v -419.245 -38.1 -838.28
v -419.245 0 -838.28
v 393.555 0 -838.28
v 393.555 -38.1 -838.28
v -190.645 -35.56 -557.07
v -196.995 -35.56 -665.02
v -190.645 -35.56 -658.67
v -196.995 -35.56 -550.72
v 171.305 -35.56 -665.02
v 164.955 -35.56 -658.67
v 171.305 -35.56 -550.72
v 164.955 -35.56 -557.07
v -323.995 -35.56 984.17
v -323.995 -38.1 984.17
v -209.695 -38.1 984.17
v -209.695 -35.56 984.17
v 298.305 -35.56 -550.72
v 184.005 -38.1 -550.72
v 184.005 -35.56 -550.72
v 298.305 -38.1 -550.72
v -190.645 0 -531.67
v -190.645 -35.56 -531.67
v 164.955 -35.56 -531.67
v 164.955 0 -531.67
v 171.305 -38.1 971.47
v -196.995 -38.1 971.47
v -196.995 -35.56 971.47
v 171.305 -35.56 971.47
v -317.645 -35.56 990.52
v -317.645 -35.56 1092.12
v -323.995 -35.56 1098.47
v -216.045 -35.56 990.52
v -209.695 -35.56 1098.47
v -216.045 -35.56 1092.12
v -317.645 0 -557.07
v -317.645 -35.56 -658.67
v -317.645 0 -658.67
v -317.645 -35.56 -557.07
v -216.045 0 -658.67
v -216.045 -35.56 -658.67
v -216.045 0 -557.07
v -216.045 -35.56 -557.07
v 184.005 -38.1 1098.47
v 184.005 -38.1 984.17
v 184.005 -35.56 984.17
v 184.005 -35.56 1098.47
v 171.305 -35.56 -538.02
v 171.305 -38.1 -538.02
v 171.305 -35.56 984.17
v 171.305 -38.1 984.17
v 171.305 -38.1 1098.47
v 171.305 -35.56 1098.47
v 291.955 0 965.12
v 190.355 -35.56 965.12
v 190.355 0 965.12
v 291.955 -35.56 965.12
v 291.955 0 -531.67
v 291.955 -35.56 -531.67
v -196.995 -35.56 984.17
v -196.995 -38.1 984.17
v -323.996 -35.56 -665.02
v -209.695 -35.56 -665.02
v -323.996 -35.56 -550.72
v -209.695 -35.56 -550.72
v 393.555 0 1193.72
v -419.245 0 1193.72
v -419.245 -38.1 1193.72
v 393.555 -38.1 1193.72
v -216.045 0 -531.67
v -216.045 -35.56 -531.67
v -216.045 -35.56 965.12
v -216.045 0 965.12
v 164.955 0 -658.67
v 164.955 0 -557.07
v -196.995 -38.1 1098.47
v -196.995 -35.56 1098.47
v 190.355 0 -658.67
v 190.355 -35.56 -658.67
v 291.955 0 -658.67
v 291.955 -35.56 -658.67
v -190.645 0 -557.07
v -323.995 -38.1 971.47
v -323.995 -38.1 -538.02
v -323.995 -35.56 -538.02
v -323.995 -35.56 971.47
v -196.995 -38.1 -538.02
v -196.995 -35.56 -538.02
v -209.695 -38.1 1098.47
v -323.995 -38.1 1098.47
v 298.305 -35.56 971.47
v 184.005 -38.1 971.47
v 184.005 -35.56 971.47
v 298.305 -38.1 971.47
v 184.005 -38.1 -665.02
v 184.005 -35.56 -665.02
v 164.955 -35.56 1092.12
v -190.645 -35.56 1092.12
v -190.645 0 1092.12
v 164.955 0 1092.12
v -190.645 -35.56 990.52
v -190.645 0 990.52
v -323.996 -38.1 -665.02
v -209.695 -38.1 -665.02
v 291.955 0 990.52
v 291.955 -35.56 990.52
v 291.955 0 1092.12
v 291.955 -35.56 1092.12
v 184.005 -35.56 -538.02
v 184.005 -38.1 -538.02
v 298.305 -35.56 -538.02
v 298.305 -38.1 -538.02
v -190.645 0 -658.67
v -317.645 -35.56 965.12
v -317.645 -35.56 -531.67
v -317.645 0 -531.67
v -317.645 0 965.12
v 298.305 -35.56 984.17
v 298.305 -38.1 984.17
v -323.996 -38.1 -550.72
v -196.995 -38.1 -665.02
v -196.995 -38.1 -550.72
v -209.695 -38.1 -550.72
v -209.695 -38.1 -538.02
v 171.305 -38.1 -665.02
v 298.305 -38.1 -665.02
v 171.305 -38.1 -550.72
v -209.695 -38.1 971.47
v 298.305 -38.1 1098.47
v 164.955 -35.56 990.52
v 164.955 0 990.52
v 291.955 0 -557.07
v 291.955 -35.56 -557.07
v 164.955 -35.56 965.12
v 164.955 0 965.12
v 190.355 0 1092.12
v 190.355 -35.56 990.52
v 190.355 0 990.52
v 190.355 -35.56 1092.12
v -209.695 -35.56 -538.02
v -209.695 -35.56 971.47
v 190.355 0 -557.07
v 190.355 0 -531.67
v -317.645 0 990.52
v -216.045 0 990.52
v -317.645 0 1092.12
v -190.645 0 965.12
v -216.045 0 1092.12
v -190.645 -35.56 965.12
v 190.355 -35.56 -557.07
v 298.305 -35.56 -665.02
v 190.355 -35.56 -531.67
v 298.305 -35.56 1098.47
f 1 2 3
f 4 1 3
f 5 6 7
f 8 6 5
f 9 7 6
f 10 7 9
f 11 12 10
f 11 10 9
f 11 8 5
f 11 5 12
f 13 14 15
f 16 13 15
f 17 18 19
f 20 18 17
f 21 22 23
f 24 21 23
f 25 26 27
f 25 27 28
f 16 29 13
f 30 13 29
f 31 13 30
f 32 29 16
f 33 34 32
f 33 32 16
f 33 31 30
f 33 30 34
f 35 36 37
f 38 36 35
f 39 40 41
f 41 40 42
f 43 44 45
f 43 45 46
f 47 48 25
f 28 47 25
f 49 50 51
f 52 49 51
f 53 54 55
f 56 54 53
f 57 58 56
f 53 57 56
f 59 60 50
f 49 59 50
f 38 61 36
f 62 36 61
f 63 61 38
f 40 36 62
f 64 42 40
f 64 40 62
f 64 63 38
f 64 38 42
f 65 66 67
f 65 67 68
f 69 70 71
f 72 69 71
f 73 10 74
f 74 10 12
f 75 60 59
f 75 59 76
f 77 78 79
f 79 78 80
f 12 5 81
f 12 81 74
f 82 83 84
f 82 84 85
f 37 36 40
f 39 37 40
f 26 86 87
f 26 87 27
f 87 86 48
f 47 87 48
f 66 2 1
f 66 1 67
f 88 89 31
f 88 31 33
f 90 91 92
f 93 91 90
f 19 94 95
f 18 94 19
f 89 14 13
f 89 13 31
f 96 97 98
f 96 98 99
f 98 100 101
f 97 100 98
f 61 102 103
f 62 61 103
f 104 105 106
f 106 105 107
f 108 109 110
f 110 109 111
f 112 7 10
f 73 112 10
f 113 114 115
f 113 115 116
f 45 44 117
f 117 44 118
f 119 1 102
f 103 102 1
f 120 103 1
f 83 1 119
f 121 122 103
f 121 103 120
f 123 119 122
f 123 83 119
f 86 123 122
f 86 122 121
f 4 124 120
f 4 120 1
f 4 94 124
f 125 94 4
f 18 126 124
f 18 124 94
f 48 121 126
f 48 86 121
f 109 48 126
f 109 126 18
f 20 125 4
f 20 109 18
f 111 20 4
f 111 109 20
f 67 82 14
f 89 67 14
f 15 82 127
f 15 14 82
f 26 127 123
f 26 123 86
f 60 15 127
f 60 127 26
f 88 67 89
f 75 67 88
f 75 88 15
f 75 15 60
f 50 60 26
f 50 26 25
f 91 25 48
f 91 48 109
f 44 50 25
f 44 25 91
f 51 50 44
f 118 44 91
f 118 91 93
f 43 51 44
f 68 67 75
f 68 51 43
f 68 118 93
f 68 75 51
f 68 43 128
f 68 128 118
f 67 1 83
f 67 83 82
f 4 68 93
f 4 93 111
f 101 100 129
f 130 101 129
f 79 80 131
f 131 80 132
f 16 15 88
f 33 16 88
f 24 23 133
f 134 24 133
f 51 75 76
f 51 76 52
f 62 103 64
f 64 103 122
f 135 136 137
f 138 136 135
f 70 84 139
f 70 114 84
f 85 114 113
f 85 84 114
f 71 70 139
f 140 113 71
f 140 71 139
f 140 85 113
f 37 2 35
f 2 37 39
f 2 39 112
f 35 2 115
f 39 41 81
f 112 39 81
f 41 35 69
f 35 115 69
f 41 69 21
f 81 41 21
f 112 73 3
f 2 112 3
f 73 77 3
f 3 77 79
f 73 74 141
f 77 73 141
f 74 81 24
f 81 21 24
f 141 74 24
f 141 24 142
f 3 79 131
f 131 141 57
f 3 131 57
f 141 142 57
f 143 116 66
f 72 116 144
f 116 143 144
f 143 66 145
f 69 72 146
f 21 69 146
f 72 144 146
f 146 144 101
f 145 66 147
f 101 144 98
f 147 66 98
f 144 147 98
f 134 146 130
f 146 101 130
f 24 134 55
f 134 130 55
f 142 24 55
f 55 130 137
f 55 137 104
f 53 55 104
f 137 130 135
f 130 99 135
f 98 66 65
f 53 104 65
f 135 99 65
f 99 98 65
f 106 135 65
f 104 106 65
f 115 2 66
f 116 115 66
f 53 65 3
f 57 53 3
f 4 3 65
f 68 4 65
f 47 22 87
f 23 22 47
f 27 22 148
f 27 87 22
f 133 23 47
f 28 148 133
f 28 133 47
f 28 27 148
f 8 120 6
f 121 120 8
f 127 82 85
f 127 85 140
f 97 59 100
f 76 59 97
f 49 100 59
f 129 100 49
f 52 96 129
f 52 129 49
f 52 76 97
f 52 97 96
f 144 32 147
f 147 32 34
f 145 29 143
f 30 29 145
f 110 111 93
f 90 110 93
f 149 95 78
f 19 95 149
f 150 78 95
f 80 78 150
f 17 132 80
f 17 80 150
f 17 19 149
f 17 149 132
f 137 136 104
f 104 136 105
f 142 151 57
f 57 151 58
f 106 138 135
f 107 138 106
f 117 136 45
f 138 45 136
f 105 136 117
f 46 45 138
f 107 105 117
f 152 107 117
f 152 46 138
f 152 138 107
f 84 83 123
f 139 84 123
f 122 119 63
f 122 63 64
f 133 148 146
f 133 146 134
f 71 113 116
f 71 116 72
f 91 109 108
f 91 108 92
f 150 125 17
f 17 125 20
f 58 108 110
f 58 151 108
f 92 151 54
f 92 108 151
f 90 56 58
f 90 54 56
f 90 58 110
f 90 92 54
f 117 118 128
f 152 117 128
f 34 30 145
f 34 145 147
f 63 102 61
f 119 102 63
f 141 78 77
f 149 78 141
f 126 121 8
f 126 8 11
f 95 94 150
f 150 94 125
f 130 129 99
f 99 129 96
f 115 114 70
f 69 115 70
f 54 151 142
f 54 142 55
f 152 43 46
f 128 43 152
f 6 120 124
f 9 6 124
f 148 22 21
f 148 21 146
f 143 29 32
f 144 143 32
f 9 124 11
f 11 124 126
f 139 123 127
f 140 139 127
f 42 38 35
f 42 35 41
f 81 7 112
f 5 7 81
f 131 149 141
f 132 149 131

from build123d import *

# Parameters (mm, degrees)
F0_W     = 812.8
F0_H     = 2032
F1_DEPTH = 38.1
F2_W     = 101.6
F2_H     = 101.6
F2_W_2   = 355.6
F2_H_2   = 1496.789953
F4_DEPTH = 309.88
F3_W     = 368.3
F3_H     = 1509.489953
F3_W_2   = 114.3
F3_H_2   = 114.3
F3_W_3   = 114.30002
F3_H_3   = 114.30002
F5_DEPTH = 2.54


with BuildPart() as f1:
    # F0 (on Front) → F1 (new body)
    with BuildSketch(Plane.XZ):
        with Locations((-12.845491, 177.719557)):
            Rectangle(F0_W, F0_H)
    extrude(amount=F1_DEPTH)

    # F2 (on face) → F4 (cut)
    with BuildSketch(Plane.XZ.offset(38.1)):
        with Locations((-266.845491, 1041.319557)):
            Rectangle(F2_W, F2_H)
        with Locations((-12.845491, 1041.319557)):
            Rectangle(F2_W_2, F2_H)
        with Locations((241.154509, 1041.319557)):
            Rectangle(F2_W, F2_H)
        with Locations((-266.845491, 216.724581)):
            Rectangle(F2_W, F2_H_2)
        with Locations((-12.845491, 216.724581)):
            Rectangle(F2_W_2, F2_H_2)
        with Locations((241.154509, 216.724581)):
            Rectangle(F2_W, F2_H_2)
        with Locations((-12.845491, -607.870396)):
            Rectangle(F2_W_2, F2_H)
        with Locations((241.154509, -607.870396)):
            Rectangle(F2_W, F2_H)
        with Locations((-266.845491, -607.870396)):
            Rectangle(F2_W, F2_H)
    extrude(amount=-F4_DEPTH, mode=Mode.SUBTRACT)

    # F3 (on face) → F5 (cut)
    with BuildSketch(Plane.XZ.offset(38.1)):
        with Locations((-12.845491, 216.724581)):
            Rectangle(F3_W, F3_H)
        with Locations((-266.845491, 216.724581)):
            Rectangle(F3_W_2, F3_H)
        with Locations((-266.845491, 1041.319557)):
            Rectangle(F3_W_2, F3_H_2)
        with Locations((-12.845491, 1041.319557)):
            Rectangle(F3_W, F3_H_2)
        with Locations((241.154509, 1041.319557)):
            Rectangle(F3_W_2, F3_H_2)
        with Locations((241.154509, 216.724581)):
            Rectangle(F3_W_2, F3_H)
        with Locations((241.154509, -607.870396)):
            Rectangle(F3_W_2, F3_H_2)
        with Locations((-12.845491, -607.870396)):
            Rectangle(F3_W, F3_H_2)
        with Locations((-266.845491, -607.870396)):
            Rectangle(F3_W_3, F3_H_3)
    extrude(amount=-F5_DEPTH, mode=Mode.SUBTRACT)


solid = f1.part
